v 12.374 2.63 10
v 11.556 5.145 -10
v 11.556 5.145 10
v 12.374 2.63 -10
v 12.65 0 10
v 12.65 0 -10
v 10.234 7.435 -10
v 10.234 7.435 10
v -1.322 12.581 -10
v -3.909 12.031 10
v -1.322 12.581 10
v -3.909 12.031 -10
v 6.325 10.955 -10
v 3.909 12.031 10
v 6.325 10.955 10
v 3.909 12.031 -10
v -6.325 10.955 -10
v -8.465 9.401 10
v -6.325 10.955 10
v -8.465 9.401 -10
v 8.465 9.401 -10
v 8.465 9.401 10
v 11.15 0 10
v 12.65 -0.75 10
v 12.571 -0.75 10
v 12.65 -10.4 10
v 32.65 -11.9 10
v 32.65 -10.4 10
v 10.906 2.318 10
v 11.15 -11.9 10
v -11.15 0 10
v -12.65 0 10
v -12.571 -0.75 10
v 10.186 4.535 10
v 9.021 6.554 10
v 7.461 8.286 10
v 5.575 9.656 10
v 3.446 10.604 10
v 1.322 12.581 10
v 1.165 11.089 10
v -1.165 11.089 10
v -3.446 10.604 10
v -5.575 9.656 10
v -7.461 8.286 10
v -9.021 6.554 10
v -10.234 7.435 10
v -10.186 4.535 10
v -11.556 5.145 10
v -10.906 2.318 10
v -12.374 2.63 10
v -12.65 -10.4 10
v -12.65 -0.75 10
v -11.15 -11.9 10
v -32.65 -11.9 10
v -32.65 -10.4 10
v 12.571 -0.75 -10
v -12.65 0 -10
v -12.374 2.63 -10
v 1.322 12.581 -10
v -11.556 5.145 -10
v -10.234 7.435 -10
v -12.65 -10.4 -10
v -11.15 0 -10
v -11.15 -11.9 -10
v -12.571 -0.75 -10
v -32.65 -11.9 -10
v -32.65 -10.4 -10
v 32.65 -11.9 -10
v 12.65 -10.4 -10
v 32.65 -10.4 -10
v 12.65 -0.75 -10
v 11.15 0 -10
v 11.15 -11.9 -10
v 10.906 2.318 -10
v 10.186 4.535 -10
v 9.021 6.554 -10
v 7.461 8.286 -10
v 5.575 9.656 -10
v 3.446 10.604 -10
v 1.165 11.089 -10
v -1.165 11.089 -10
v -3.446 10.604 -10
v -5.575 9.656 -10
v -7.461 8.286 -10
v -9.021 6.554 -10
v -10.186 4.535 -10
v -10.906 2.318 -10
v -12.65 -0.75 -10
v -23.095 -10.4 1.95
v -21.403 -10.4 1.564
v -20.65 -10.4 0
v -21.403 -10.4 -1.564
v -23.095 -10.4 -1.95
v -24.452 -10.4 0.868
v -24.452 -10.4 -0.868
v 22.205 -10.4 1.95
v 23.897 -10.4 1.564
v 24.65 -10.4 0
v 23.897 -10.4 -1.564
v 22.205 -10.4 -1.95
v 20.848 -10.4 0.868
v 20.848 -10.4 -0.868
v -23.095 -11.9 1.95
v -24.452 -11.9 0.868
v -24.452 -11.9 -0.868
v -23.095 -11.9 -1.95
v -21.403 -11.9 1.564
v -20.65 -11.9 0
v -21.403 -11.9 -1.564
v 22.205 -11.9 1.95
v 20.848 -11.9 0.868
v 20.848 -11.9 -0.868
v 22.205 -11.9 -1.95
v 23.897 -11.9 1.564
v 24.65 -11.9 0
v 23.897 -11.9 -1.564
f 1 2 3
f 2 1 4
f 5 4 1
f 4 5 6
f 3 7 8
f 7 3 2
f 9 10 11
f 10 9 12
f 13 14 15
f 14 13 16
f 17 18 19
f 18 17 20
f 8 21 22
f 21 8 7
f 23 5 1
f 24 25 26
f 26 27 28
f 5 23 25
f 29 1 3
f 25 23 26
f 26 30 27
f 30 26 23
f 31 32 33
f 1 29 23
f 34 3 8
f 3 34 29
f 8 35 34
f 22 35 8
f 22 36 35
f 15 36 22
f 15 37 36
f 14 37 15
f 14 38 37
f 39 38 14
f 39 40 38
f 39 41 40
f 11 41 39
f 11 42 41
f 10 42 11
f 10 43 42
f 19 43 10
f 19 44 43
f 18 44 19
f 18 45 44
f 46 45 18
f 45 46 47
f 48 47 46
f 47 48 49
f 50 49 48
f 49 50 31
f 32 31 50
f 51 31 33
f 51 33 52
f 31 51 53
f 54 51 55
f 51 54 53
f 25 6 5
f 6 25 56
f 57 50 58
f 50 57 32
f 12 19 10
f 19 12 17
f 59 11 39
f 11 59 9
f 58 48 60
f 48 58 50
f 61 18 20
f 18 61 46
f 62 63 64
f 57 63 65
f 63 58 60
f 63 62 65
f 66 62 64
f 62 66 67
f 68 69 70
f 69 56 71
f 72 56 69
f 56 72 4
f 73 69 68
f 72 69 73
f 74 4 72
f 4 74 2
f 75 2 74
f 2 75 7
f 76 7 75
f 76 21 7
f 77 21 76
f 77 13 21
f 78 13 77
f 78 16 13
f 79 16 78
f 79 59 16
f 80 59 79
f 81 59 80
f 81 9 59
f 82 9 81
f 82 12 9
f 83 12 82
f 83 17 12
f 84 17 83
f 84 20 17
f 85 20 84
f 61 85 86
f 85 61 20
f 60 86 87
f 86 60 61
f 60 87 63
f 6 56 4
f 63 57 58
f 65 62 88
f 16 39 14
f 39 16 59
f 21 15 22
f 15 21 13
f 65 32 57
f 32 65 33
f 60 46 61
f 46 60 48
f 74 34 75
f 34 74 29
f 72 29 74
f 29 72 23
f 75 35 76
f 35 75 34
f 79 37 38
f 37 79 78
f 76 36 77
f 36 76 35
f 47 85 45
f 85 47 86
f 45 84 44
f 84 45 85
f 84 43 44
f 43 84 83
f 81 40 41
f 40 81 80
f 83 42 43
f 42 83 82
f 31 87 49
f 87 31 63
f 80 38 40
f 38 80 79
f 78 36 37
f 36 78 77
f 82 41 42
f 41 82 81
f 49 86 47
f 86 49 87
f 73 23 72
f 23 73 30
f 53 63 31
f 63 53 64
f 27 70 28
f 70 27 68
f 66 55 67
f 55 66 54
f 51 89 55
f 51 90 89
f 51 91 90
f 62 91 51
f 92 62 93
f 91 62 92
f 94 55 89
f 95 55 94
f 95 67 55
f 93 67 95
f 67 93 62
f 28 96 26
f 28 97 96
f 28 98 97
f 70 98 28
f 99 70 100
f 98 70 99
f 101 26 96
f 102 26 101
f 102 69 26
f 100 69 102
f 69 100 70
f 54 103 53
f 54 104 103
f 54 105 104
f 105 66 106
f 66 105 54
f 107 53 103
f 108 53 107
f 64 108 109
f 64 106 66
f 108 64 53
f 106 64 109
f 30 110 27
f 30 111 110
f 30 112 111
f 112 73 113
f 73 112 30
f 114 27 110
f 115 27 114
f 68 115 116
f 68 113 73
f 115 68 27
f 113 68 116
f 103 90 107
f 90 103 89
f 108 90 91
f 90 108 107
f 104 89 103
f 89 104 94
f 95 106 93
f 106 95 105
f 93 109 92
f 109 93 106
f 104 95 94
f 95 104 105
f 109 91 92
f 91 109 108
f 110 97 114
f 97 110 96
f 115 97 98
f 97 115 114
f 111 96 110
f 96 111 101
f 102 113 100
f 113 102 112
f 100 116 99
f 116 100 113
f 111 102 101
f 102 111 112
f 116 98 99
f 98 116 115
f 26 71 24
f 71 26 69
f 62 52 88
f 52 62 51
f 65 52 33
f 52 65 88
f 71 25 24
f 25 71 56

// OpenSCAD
// Parametric Saddle Clamp

pipe_od = 22.3;		// diameter of the pipe to hang
strap_width = 20;		// width of the strap
strap_tab = 20;		// how long you want each screw tab to extend from the saddle
strap_thick = 1.5;	// thickness of your strap
screw_hole = 4;		// diameter of the screw hole


// No need to edit beyond here unless you want to change how the object is rendered

pipe_rad = pipe_od/2;
screw_rad = screw_hole/2;

union() {

	// the pipe
	difference() {
		cylinder(r=pipe_rad+strap_thick, h=strap_width, center=true);
		cylinder(r=pipe_rad, h=strap_width+1, center=true);
		translate([0,-pipe_rad/2-strap_thick/2,0]) cube(size=[pipe_od, pipe_rad+strap_thick,strap_width], center=true);
	}

	// subtract to make the saddle
	difference() {
		translate([0,-pipe_rad,0]) cube(size=[strap_tab*2+pipe_od+2*strap_thick, strap_thick, strap_width], center=true);
		translate([0,-pipe_rad/2-strap_thick/2,0]) cube(size=[pipe_od, pipe_rad+strap_thick,strap_width], center=true);
		translate([-pipe_rad-strap_tab/2-strap_thick,0,0]) rotate([90,0,0]) cylinder(r=screw_rad, h=100, center=true);
		translate([pipe_rad+strap_tab/2+strap_thick,0,0]) rotate([90,0,0]) cylinder(r=screw_rad, h=100, center=true);
	}

	// make the straps
	difference() {
		translate([0,-pipe_rad/2-strap_thick/2,0]) cube(size=[pipe_od+strap_thick*2, pipe_rad,strap_width], center=true);
		translate([0,-pipe_rad/2-strap_thick/2,0]) cube(size=[pipe_od, pipe_rad,strap_width], center=true);
	}

}
